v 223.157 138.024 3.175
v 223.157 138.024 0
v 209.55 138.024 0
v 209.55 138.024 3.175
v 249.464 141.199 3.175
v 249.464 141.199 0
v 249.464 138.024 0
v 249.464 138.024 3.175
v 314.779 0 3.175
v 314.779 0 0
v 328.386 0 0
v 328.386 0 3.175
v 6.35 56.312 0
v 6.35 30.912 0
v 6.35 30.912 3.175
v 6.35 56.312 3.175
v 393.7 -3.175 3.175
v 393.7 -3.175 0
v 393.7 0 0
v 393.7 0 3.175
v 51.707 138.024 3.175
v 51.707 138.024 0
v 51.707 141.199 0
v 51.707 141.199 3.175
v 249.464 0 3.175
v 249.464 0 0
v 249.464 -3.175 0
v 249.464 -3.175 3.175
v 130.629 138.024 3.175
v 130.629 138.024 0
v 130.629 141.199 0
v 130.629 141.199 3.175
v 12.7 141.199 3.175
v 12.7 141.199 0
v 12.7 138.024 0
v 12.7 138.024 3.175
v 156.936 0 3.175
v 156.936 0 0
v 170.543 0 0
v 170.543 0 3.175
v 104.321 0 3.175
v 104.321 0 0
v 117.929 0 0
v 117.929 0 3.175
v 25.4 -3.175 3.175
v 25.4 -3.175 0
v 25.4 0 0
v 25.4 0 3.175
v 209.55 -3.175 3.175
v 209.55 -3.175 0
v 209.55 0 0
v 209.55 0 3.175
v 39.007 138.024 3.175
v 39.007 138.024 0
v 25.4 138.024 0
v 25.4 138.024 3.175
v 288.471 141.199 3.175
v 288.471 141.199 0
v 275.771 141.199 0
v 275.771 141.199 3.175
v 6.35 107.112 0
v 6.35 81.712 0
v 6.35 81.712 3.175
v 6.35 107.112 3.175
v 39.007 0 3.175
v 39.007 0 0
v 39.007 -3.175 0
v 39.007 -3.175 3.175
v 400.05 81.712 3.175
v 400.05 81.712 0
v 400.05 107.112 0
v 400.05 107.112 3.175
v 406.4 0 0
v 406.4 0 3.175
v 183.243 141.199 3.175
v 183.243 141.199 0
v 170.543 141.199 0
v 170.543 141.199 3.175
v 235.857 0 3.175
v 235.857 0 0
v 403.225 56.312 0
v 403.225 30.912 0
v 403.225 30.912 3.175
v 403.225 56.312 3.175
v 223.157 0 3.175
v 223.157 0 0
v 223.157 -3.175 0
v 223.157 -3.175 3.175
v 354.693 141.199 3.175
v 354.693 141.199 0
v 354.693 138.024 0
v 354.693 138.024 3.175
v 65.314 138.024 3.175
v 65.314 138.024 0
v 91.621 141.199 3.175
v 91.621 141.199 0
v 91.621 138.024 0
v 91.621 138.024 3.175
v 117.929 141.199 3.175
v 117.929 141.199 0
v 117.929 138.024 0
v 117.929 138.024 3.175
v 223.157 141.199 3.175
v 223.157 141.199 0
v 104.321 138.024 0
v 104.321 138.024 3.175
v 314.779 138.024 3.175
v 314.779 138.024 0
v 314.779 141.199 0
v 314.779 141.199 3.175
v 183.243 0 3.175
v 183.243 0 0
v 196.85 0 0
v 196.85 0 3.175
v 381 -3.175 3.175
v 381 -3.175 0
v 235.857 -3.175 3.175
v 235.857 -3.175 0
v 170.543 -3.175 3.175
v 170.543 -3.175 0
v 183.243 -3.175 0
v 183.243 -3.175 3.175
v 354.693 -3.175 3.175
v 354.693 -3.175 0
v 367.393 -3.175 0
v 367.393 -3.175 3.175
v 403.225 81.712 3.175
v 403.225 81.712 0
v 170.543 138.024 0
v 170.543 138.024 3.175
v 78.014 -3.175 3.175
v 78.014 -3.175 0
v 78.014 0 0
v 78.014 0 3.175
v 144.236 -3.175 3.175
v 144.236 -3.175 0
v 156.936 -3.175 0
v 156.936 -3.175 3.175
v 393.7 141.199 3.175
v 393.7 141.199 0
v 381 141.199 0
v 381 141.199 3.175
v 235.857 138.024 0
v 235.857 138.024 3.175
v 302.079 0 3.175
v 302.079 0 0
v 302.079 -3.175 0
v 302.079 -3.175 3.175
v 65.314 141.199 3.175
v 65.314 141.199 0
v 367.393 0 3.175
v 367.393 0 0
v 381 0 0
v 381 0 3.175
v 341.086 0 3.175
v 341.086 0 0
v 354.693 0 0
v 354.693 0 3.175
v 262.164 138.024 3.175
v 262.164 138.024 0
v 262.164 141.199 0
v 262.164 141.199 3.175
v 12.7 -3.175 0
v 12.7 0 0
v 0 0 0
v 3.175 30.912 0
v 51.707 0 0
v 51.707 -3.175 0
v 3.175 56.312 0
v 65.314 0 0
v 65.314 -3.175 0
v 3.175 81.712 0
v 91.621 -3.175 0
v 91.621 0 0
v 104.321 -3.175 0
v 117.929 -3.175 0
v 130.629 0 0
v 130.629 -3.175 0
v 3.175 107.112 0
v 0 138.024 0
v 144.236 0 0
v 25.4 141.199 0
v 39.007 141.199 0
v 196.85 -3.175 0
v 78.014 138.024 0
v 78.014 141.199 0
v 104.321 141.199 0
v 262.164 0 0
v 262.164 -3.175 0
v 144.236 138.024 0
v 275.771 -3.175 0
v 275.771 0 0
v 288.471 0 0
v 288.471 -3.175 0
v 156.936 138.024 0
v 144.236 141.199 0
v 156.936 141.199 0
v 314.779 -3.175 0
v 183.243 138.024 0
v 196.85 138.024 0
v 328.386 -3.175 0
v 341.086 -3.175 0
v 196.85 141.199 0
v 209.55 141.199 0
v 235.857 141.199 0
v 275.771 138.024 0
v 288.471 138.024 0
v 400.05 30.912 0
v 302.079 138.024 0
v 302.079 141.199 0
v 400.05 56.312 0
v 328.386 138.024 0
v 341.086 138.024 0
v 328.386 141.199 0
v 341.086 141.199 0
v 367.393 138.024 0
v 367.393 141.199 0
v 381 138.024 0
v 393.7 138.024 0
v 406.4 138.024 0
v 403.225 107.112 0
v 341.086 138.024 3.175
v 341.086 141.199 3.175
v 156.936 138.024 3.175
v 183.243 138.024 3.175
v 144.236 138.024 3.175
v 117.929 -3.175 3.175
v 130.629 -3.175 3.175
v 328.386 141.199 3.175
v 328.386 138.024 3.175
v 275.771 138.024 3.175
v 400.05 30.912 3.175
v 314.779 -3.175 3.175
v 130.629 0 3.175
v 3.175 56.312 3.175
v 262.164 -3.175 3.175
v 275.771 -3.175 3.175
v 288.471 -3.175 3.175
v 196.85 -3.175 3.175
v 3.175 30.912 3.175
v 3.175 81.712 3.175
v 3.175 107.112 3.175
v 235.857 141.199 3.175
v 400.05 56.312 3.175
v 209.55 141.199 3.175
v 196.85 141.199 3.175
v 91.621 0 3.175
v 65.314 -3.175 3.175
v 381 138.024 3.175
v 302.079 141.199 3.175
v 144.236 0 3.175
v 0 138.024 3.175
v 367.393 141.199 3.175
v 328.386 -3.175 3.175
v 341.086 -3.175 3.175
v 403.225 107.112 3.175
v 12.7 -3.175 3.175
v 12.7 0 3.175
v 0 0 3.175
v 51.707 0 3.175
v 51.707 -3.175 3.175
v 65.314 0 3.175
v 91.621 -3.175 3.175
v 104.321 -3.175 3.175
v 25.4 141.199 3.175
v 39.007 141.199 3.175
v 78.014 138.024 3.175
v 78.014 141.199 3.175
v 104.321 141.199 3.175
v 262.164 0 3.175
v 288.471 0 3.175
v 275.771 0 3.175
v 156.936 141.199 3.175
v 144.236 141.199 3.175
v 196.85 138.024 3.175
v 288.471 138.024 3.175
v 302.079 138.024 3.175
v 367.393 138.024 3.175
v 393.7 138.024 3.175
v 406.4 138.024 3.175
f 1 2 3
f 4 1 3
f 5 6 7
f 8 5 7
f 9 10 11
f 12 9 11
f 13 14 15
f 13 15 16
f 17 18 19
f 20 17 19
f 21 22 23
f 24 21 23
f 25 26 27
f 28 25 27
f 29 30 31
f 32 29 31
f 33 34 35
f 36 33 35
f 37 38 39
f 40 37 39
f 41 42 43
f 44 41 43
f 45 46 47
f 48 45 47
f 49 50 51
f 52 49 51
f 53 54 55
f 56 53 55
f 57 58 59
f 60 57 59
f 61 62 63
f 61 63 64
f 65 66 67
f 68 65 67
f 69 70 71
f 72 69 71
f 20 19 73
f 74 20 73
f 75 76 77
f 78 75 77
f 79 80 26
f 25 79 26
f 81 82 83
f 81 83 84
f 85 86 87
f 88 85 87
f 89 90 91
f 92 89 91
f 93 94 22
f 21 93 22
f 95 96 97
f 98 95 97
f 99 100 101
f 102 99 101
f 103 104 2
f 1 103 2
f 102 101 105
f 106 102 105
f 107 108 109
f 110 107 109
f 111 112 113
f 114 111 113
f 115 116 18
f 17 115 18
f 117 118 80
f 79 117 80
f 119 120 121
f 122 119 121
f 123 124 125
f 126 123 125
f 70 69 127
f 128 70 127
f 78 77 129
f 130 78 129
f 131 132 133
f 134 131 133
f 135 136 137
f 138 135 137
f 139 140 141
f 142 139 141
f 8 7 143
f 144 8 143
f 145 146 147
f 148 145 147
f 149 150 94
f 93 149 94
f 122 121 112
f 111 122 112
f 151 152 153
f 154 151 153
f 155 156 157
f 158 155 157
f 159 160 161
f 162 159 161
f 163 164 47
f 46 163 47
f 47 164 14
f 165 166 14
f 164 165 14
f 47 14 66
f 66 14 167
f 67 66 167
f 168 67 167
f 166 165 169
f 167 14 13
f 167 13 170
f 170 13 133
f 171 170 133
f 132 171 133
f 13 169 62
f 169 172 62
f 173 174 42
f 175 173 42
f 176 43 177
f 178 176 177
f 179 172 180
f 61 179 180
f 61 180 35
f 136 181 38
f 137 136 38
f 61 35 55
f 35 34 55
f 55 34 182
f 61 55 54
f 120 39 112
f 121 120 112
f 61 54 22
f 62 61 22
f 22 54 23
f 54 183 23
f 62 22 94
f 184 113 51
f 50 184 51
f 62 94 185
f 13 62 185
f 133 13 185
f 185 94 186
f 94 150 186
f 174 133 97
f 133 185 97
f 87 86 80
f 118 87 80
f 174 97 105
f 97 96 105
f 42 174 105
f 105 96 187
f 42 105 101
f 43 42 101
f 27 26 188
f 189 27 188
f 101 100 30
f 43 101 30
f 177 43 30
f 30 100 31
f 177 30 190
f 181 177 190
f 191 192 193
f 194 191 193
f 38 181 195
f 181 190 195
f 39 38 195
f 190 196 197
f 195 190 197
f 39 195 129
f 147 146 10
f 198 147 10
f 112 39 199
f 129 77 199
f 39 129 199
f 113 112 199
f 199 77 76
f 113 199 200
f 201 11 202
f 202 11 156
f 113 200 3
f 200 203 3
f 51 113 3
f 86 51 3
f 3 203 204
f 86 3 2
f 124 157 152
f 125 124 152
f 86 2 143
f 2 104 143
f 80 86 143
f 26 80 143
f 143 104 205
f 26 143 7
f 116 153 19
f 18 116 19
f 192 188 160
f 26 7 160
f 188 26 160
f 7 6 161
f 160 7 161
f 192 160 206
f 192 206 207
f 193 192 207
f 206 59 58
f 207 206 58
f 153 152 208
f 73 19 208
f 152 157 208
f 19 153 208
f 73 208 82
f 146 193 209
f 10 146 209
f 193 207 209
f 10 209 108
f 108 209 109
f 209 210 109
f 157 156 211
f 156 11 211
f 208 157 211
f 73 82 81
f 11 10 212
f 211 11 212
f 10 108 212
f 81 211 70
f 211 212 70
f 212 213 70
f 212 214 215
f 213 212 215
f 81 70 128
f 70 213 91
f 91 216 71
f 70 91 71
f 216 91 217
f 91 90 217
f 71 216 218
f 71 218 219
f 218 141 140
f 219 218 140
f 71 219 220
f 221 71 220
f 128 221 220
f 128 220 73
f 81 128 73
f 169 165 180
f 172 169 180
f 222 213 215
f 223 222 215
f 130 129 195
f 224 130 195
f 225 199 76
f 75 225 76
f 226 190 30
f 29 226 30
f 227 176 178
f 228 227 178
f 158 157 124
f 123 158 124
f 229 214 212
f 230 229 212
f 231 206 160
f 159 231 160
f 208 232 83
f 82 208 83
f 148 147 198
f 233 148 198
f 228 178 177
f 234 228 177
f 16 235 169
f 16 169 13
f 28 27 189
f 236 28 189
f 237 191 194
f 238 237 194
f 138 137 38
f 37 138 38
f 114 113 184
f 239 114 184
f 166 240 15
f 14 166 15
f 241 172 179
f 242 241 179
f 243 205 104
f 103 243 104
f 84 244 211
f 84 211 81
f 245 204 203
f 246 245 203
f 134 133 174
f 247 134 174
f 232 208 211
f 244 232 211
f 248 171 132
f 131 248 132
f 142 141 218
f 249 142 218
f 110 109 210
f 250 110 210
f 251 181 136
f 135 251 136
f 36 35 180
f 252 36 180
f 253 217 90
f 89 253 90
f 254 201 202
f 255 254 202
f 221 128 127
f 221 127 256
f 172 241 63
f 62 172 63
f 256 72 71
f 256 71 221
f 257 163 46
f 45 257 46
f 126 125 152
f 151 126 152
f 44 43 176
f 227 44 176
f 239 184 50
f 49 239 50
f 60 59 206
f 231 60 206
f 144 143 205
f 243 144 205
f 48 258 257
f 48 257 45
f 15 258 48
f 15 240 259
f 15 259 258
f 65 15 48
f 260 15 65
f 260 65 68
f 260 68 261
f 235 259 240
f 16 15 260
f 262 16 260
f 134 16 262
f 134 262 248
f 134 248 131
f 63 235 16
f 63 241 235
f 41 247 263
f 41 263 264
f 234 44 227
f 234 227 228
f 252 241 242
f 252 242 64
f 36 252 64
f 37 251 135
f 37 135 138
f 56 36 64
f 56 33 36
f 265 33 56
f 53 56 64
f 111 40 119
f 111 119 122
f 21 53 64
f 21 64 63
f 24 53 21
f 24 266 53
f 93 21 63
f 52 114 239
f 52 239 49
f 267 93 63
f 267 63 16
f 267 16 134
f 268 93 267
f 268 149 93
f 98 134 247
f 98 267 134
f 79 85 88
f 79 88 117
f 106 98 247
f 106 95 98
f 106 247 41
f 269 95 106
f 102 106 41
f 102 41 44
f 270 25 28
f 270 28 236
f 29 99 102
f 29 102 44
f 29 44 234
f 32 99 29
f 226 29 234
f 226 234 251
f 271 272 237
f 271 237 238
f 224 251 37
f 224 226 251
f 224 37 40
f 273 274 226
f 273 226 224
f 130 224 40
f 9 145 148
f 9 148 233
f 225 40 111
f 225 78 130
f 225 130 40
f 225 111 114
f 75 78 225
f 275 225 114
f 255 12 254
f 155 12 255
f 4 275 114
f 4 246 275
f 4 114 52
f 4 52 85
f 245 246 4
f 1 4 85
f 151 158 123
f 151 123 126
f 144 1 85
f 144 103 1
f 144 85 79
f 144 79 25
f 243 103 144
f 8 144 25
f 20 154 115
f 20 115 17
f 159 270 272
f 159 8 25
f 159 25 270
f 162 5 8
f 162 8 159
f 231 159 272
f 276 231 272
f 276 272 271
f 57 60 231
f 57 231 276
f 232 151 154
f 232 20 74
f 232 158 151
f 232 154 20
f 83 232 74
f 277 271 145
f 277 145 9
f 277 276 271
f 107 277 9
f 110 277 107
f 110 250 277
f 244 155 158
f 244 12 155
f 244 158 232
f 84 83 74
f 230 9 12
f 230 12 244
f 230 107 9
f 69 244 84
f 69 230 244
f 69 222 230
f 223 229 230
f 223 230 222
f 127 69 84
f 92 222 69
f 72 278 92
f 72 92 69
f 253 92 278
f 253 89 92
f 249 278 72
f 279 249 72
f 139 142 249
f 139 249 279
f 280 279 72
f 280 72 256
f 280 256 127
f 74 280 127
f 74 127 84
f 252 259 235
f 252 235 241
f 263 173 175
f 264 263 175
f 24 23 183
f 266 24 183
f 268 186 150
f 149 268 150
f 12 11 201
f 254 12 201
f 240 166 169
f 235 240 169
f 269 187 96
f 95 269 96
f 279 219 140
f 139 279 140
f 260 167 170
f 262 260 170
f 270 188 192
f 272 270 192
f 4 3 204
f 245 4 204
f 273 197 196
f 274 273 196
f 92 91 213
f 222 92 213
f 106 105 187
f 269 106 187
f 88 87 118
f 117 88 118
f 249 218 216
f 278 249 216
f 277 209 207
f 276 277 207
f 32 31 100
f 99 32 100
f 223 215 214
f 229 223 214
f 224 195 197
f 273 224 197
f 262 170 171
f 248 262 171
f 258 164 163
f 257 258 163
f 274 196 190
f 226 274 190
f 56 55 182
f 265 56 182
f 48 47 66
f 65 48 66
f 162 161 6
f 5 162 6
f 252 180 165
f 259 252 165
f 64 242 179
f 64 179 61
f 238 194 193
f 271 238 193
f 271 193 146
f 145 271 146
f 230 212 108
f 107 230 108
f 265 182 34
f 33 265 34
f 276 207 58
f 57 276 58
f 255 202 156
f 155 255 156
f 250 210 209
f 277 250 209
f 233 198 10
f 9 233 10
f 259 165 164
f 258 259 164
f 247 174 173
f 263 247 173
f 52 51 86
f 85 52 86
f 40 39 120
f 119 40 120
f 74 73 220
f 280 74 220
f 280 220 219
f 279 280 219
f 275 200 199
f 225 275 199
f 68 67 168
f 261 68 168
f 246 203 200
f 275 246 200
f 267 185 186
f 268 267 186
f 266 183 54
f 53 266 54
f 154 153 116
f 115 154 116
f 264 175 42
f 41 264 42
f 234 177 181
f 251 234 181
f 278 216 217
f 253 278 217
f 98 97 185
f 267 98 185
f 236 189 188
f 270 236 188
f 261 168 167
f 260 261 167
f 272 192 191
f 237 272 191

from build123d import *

# Parameters (mm, degrees)
SKETCH1_W           = 3.175
SKETCH1_H           = 25.4
BOSS_EXTRUDE1_DEPTH = 3.175


with BuildPart() as part:
    # Sketch1 → Boss-Extrude1 (new body)
    with BuildSketch(Plane.XY):
        Polygon((406.4, 0), (406.4, 138.0236), (393.7, 138.0236), (393.7, 141.1986), (381, 141.1986), (381, 138.0236), (367.392857143, 138.0236), (367.392857143, 141.1986), (354.692857143, 141.1986), (354.692857143, 138.0236), (341.085714286, 138.0236), (341.085714286, 141.1986), (328.385714286, 141.1986), (328.385714286, 138.0236), (314.778571429, 138.0236), (314.778571429, 141.1986), (302.078571429, 141.1986), (302.078571429, 138.0236), (288.471428571, 138.0236), (288.471428571, 141.1986), (275.771428571, 141.1986), (275.771428571, 138.0236), (262.164285714, 138.0236), (262.164285714, 141.1986), (249.464285714, 141.1986), (249.464285714, 138.0236), (235.857142857, 138.0236), (235.857142857, 141.1986), (223.157142857, 141.1986), (223.157142857, 138.0236), (209.55, 138.0236), (209.55, 141.1986), (196.85, 141.1986), (196.85, 138.0236), (183.242857143, 138.0236), (183.242857143, 141.1986), (170.542857143, 141.1986), (170.542857143, 138.0236), (156.935714286, 138.0236), (156.935714286, 141.1986), (144.235714286, 141.1986), (144.235714286, 138.0236), (130.628571429, 138.0236), (130.628571429, 141.1986), (117.928571429, 141.1986), (117.928571429, 138.0236), (104.321428571, 138.0236), (104.321428571, 141.1986), (91.621428571, 141.1986), (91.621428571, 138.0236), (78.014285714, 138.0236), (78.014285714, 141.1986), (65.314285714, 141.1986), (65.314285714, 138.0236), (51.707142857, 138.0236), (51.707142857, 141.1986), (39.007142857, 141.1986), (39.007142857, 138.0236), (25.4, 138.0236), (25.4, 141.1986), (12.7, 141.1986), (12.7, 138.0236), (0, 138.0236), (0, 0), (12.7, 0), (12.7, -3.175), (25.4, -3.175), (25.4, 0), (39.007142857, 0), (39.007142857, -3.175), (51.707142857, -3.175), (51.707142857, 0), (65.314285714, 0), (65.314285714, -3.175), (78.014285714, -3.175), (78.014285714, 0), (91.621428571, 0), (91.621428571, -3.175), (104.321428571, -3.175), (104.321428571, 0), (117.928571429, 0), (117.928571429, -3.175), (130.628571429, -3.175), (130.628571429, 0), (144.235714286, 0), (144.235714286, -3.175), (156.935714286, -3.175), (156.935714286, 0), (170.542857143, 0), (170.542857143, -3.175), (183.242857143, -3.175), (183.242857143, 0), (196.85, 0), (196.85, -3.175), (209.55, -3.175), (209.55, 0), (223.157142857, 0), (223.157142857, -3.175), (235.857142857, -3.175), (235.857142857, 0), (249.464285714, 0), (249.464285714, -3.175), (262.164285714, -3.175), (262.164285714, 0), (275.771428571, 0), (275.771428571, -3.175), (288.471428571, -3.175), (288.471428571, 0), (302.078571429, 0), (302.078571429, -3.175), (314.778571429, -3.175), (314.778571429, 0), (328.385714286, 0), (328.385714286, -3.175), (341.085714286, -3.175), (341.085714286, 0), (354.692857143, 0), (354.692857143, -3.175), (367.392857143, -3.175), (367.392857143, 0), (381, 0), (381, -3.175), (393.7, -3.175), (393.7, 0), align=None)
        with Locations((4.7625, 94.4118)):
            Rectangle(SKETCH1_W, SKETCH1_H, mode=Mode.SUBTRACT)
        with Locations((4.7625, 43.6118)):
            Rectangle(SKETCH1_W, SKETCH1_H, mode=Mode.SUBTRACT)
        with Locations((401.6375, 43.6118)):
            Rectangle(SKETCH1_W, SKETCH1_H, mode=Mode.SUBTRACT)
        with Locations((401.6375, 94.4118)):
            Rectangle(SKETCH1_W, SKETCH1_H, mode=Mode.SUBTRACT)
    extrude(amount=BOSS_EXTRUDE1_DEPTH)


solid = part.part
